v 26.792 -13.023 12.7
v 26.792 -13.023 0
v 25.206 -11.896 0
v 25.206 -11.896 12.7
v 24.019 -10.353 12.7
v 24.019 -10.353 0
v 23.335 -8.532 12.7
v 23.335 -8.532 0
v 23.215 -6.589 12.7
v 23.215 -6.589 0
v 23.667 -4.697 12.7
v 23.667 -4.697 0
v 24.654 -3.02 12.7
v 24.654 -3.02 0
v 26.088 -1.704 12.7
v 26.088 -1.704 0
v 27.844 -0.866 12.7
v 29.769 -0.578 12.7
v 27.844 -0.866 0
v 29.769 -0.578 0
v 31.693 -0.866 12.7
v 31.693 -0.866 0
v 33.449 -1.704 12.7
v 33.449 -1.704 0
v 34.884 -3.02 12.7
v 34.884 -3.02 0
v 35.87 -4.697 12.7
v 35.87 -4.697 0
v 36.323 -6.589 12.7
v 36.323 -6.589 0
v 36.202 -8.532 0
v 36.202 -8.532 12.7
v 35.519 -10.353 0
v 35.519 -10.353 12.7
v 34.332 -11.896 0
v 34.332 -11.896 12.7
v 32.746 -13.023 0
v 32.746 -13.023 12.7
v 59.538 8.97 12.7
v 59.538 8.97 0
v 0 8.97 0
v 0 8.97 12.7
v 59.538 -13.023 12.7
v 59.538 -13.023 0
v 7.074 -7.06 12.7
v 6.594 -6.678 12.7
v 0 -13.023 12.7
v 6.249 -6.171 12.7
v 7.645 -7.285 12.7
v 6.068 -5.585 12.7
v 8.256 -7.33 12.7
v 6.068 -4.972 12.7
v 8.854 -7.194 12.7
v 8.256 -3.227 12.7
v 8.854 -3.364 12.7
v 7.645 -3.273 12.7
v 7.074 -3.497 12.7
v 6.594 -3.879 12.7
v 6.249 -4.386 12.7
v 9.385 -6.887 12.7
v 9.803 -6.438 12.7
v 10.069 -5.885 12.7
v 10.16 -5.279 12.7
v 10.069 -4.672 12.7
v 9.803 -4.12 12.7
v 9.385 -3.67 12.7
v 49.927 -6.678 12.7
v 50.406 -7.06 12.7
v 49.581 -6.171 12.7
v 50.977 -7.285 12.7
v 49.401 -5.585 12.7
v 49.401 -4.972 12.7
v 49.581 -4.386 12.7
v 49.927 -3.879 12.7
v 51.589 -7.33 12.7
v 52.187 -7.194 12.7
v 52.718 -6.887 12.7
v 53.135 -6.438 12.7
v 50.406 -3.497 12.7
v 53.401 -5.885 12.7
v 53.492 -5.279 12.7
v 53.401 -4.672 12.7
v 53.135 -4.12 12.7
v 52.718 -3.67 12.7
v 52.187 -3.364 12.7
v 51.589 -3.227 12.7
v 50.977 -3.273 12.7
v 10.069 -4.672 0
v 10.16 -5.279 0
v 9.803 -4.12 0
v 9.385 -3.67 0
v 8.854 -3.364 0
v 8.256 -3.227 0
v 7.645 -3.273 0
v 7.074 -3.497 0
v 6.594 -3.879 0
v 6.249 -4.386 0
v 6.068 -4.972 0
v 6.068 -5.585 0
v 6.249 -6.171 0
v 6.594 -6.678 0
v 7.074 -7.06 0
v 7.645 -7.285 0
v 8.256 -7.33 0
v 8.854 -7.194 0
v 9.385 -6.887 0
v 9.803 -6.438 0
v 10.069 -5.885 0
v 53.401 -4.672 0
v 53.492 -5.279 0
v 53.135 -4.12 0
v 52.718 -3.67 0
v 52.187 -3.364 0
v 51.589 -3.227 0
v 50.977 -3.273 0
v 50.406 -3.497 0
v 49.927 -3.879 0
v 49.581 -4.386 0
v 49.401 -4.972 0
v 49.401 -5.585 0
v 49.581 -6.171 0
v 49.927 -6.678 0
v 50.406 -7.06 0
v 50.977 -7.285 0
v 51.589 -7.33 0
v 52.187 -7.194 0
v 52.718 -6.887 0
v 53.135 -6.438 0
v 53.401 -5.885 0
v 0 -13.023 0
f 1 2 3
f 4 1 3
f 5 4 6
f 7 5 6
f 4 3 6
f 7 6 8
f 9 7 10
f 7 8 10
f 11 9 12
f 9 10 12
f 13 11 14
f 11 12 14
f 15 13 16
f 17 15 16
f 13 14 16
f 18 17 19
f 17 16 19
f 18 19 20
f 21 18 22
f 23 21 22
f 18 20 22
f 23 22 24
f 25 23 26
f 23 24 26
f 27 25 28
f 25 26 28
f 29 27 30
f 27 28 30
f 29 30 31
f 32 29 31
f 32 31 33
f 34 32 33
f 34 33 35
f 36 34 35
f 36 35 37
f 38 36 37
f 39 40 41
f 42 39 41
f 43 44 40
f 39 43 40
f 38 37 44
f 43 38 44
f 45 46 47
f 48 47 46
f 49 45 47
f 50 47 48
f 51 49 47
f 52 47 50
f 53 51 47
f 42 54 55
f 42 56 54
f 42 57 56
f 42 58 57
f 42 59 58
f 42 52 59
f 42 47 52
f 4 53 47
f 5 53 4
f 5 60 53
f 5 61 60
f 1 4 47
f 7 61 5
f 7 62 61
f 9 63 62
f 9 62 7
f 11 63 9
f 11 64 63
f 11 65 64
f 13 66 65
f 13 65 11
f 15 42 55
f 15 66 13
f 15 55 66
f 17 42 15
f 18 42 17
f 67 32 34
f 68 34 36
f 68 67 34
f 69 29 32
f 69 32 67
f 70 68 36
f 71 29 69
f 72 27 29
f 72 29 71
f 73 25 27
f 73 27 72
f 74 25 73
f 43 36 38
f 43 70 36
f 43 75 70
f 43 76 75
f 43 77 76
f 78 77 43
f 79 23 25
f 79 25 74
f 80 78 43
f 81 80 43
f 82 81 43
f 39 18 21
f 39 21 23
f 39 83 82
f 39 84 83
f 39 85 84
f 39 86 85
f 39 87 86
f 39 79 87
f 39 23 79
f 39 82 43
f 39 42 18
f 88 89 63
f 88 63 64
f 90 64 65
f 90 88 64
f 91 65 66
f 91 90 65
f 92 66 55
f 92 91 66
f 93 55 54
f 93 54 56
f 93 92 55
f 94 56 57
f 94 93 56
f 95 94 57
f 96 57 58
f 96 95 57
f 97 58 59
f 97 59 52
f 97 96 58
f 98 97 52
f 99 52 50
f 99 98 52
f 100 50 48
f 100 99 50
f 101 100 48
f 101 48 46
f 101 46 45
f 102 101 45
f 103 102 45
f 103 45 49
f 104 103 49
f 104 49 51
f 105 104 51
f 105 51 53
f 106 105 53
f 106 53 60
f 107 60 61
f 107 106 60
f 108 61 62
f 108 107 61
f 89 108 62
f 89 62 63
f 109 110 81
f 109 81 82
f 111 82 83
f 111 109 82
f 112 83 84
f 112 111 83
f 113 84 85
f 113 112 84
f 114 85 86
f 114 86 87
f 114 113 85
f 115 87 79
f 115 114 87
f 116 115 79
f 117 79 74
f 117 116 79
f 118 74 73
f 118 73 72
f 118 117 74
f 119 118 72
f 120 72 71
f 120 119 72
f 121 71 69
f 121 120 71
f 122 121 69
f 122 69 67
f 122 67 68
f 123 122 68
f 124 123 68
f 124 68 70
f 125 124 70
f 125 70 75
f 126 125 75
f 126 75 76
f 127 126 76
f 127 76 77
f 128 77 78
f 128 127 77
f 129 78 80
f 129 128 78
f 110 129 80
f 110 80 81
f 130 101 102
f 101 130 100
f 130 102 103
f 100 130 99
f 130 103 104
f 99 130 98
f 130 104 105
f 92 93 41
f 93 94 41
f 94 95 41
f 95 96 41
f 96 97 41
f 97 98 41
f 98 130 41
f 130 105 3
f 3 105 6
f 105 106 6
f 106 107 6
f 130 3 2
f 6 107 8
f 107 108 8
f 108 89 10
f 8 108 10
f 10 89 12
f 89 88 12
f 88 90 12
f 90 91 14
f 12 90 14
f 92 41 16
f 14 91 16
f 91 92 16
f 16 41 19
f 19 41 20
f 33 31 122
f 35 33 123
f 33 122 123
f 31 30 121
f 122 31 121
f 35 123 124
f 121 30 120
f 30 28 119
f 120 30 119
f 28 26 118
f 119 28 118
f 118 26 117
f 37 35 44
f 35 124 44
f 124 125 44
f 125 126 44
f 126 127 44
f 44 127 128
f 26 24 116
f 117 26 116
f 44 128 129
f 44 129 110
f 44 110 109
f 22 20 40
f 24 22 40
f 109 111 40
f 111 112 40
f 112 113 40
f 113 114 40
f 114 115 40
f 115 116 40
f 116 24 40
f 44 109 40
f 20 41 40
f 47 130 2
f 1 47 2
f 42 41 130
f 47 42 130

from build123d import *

# Parameters (mm, degrees)
F0_R     = 2.0574
F1_DEPTH = 12.7


# Not quite as in the source:
# - a feature names something its author has since deleted; it is built from what else it names


with BuildPart() as f1:
    # F0 (on Top) → F1 (new body)
    with BuildSketch(Plane.XY):
        with BuildLine():
            Line((0, 8.9704120984), (0, -13.0232248562))
            Line((0, -13.0232248562), (26.7917899333, -13.0232248562))
            ThreePointArc((26.7917899333, -13.0232248562), (29.7688, -0.5781617802), (32.7458100667, -13.0232248562))
            Line((32.7458100667, -13.0232248562), (59.5376, -13.0232248562))
            Line((59.5376, -13.0232248562), (59.5376, 8.9704120984))
            Line((59.5376, 8.9704120984), (0, 8.9704120984))
        make_face()
        with Locations((8.1026, -5.2786845261)):
            Circle(F0_R, mode=Mode.SUBTRACT)
        with Locations((51.435, -5.2786845261)):
            Circle(F0_R, mode=Mode.SUBTRACT)
    extrude(amount=F1_DEPTH)


solid = f1.part
